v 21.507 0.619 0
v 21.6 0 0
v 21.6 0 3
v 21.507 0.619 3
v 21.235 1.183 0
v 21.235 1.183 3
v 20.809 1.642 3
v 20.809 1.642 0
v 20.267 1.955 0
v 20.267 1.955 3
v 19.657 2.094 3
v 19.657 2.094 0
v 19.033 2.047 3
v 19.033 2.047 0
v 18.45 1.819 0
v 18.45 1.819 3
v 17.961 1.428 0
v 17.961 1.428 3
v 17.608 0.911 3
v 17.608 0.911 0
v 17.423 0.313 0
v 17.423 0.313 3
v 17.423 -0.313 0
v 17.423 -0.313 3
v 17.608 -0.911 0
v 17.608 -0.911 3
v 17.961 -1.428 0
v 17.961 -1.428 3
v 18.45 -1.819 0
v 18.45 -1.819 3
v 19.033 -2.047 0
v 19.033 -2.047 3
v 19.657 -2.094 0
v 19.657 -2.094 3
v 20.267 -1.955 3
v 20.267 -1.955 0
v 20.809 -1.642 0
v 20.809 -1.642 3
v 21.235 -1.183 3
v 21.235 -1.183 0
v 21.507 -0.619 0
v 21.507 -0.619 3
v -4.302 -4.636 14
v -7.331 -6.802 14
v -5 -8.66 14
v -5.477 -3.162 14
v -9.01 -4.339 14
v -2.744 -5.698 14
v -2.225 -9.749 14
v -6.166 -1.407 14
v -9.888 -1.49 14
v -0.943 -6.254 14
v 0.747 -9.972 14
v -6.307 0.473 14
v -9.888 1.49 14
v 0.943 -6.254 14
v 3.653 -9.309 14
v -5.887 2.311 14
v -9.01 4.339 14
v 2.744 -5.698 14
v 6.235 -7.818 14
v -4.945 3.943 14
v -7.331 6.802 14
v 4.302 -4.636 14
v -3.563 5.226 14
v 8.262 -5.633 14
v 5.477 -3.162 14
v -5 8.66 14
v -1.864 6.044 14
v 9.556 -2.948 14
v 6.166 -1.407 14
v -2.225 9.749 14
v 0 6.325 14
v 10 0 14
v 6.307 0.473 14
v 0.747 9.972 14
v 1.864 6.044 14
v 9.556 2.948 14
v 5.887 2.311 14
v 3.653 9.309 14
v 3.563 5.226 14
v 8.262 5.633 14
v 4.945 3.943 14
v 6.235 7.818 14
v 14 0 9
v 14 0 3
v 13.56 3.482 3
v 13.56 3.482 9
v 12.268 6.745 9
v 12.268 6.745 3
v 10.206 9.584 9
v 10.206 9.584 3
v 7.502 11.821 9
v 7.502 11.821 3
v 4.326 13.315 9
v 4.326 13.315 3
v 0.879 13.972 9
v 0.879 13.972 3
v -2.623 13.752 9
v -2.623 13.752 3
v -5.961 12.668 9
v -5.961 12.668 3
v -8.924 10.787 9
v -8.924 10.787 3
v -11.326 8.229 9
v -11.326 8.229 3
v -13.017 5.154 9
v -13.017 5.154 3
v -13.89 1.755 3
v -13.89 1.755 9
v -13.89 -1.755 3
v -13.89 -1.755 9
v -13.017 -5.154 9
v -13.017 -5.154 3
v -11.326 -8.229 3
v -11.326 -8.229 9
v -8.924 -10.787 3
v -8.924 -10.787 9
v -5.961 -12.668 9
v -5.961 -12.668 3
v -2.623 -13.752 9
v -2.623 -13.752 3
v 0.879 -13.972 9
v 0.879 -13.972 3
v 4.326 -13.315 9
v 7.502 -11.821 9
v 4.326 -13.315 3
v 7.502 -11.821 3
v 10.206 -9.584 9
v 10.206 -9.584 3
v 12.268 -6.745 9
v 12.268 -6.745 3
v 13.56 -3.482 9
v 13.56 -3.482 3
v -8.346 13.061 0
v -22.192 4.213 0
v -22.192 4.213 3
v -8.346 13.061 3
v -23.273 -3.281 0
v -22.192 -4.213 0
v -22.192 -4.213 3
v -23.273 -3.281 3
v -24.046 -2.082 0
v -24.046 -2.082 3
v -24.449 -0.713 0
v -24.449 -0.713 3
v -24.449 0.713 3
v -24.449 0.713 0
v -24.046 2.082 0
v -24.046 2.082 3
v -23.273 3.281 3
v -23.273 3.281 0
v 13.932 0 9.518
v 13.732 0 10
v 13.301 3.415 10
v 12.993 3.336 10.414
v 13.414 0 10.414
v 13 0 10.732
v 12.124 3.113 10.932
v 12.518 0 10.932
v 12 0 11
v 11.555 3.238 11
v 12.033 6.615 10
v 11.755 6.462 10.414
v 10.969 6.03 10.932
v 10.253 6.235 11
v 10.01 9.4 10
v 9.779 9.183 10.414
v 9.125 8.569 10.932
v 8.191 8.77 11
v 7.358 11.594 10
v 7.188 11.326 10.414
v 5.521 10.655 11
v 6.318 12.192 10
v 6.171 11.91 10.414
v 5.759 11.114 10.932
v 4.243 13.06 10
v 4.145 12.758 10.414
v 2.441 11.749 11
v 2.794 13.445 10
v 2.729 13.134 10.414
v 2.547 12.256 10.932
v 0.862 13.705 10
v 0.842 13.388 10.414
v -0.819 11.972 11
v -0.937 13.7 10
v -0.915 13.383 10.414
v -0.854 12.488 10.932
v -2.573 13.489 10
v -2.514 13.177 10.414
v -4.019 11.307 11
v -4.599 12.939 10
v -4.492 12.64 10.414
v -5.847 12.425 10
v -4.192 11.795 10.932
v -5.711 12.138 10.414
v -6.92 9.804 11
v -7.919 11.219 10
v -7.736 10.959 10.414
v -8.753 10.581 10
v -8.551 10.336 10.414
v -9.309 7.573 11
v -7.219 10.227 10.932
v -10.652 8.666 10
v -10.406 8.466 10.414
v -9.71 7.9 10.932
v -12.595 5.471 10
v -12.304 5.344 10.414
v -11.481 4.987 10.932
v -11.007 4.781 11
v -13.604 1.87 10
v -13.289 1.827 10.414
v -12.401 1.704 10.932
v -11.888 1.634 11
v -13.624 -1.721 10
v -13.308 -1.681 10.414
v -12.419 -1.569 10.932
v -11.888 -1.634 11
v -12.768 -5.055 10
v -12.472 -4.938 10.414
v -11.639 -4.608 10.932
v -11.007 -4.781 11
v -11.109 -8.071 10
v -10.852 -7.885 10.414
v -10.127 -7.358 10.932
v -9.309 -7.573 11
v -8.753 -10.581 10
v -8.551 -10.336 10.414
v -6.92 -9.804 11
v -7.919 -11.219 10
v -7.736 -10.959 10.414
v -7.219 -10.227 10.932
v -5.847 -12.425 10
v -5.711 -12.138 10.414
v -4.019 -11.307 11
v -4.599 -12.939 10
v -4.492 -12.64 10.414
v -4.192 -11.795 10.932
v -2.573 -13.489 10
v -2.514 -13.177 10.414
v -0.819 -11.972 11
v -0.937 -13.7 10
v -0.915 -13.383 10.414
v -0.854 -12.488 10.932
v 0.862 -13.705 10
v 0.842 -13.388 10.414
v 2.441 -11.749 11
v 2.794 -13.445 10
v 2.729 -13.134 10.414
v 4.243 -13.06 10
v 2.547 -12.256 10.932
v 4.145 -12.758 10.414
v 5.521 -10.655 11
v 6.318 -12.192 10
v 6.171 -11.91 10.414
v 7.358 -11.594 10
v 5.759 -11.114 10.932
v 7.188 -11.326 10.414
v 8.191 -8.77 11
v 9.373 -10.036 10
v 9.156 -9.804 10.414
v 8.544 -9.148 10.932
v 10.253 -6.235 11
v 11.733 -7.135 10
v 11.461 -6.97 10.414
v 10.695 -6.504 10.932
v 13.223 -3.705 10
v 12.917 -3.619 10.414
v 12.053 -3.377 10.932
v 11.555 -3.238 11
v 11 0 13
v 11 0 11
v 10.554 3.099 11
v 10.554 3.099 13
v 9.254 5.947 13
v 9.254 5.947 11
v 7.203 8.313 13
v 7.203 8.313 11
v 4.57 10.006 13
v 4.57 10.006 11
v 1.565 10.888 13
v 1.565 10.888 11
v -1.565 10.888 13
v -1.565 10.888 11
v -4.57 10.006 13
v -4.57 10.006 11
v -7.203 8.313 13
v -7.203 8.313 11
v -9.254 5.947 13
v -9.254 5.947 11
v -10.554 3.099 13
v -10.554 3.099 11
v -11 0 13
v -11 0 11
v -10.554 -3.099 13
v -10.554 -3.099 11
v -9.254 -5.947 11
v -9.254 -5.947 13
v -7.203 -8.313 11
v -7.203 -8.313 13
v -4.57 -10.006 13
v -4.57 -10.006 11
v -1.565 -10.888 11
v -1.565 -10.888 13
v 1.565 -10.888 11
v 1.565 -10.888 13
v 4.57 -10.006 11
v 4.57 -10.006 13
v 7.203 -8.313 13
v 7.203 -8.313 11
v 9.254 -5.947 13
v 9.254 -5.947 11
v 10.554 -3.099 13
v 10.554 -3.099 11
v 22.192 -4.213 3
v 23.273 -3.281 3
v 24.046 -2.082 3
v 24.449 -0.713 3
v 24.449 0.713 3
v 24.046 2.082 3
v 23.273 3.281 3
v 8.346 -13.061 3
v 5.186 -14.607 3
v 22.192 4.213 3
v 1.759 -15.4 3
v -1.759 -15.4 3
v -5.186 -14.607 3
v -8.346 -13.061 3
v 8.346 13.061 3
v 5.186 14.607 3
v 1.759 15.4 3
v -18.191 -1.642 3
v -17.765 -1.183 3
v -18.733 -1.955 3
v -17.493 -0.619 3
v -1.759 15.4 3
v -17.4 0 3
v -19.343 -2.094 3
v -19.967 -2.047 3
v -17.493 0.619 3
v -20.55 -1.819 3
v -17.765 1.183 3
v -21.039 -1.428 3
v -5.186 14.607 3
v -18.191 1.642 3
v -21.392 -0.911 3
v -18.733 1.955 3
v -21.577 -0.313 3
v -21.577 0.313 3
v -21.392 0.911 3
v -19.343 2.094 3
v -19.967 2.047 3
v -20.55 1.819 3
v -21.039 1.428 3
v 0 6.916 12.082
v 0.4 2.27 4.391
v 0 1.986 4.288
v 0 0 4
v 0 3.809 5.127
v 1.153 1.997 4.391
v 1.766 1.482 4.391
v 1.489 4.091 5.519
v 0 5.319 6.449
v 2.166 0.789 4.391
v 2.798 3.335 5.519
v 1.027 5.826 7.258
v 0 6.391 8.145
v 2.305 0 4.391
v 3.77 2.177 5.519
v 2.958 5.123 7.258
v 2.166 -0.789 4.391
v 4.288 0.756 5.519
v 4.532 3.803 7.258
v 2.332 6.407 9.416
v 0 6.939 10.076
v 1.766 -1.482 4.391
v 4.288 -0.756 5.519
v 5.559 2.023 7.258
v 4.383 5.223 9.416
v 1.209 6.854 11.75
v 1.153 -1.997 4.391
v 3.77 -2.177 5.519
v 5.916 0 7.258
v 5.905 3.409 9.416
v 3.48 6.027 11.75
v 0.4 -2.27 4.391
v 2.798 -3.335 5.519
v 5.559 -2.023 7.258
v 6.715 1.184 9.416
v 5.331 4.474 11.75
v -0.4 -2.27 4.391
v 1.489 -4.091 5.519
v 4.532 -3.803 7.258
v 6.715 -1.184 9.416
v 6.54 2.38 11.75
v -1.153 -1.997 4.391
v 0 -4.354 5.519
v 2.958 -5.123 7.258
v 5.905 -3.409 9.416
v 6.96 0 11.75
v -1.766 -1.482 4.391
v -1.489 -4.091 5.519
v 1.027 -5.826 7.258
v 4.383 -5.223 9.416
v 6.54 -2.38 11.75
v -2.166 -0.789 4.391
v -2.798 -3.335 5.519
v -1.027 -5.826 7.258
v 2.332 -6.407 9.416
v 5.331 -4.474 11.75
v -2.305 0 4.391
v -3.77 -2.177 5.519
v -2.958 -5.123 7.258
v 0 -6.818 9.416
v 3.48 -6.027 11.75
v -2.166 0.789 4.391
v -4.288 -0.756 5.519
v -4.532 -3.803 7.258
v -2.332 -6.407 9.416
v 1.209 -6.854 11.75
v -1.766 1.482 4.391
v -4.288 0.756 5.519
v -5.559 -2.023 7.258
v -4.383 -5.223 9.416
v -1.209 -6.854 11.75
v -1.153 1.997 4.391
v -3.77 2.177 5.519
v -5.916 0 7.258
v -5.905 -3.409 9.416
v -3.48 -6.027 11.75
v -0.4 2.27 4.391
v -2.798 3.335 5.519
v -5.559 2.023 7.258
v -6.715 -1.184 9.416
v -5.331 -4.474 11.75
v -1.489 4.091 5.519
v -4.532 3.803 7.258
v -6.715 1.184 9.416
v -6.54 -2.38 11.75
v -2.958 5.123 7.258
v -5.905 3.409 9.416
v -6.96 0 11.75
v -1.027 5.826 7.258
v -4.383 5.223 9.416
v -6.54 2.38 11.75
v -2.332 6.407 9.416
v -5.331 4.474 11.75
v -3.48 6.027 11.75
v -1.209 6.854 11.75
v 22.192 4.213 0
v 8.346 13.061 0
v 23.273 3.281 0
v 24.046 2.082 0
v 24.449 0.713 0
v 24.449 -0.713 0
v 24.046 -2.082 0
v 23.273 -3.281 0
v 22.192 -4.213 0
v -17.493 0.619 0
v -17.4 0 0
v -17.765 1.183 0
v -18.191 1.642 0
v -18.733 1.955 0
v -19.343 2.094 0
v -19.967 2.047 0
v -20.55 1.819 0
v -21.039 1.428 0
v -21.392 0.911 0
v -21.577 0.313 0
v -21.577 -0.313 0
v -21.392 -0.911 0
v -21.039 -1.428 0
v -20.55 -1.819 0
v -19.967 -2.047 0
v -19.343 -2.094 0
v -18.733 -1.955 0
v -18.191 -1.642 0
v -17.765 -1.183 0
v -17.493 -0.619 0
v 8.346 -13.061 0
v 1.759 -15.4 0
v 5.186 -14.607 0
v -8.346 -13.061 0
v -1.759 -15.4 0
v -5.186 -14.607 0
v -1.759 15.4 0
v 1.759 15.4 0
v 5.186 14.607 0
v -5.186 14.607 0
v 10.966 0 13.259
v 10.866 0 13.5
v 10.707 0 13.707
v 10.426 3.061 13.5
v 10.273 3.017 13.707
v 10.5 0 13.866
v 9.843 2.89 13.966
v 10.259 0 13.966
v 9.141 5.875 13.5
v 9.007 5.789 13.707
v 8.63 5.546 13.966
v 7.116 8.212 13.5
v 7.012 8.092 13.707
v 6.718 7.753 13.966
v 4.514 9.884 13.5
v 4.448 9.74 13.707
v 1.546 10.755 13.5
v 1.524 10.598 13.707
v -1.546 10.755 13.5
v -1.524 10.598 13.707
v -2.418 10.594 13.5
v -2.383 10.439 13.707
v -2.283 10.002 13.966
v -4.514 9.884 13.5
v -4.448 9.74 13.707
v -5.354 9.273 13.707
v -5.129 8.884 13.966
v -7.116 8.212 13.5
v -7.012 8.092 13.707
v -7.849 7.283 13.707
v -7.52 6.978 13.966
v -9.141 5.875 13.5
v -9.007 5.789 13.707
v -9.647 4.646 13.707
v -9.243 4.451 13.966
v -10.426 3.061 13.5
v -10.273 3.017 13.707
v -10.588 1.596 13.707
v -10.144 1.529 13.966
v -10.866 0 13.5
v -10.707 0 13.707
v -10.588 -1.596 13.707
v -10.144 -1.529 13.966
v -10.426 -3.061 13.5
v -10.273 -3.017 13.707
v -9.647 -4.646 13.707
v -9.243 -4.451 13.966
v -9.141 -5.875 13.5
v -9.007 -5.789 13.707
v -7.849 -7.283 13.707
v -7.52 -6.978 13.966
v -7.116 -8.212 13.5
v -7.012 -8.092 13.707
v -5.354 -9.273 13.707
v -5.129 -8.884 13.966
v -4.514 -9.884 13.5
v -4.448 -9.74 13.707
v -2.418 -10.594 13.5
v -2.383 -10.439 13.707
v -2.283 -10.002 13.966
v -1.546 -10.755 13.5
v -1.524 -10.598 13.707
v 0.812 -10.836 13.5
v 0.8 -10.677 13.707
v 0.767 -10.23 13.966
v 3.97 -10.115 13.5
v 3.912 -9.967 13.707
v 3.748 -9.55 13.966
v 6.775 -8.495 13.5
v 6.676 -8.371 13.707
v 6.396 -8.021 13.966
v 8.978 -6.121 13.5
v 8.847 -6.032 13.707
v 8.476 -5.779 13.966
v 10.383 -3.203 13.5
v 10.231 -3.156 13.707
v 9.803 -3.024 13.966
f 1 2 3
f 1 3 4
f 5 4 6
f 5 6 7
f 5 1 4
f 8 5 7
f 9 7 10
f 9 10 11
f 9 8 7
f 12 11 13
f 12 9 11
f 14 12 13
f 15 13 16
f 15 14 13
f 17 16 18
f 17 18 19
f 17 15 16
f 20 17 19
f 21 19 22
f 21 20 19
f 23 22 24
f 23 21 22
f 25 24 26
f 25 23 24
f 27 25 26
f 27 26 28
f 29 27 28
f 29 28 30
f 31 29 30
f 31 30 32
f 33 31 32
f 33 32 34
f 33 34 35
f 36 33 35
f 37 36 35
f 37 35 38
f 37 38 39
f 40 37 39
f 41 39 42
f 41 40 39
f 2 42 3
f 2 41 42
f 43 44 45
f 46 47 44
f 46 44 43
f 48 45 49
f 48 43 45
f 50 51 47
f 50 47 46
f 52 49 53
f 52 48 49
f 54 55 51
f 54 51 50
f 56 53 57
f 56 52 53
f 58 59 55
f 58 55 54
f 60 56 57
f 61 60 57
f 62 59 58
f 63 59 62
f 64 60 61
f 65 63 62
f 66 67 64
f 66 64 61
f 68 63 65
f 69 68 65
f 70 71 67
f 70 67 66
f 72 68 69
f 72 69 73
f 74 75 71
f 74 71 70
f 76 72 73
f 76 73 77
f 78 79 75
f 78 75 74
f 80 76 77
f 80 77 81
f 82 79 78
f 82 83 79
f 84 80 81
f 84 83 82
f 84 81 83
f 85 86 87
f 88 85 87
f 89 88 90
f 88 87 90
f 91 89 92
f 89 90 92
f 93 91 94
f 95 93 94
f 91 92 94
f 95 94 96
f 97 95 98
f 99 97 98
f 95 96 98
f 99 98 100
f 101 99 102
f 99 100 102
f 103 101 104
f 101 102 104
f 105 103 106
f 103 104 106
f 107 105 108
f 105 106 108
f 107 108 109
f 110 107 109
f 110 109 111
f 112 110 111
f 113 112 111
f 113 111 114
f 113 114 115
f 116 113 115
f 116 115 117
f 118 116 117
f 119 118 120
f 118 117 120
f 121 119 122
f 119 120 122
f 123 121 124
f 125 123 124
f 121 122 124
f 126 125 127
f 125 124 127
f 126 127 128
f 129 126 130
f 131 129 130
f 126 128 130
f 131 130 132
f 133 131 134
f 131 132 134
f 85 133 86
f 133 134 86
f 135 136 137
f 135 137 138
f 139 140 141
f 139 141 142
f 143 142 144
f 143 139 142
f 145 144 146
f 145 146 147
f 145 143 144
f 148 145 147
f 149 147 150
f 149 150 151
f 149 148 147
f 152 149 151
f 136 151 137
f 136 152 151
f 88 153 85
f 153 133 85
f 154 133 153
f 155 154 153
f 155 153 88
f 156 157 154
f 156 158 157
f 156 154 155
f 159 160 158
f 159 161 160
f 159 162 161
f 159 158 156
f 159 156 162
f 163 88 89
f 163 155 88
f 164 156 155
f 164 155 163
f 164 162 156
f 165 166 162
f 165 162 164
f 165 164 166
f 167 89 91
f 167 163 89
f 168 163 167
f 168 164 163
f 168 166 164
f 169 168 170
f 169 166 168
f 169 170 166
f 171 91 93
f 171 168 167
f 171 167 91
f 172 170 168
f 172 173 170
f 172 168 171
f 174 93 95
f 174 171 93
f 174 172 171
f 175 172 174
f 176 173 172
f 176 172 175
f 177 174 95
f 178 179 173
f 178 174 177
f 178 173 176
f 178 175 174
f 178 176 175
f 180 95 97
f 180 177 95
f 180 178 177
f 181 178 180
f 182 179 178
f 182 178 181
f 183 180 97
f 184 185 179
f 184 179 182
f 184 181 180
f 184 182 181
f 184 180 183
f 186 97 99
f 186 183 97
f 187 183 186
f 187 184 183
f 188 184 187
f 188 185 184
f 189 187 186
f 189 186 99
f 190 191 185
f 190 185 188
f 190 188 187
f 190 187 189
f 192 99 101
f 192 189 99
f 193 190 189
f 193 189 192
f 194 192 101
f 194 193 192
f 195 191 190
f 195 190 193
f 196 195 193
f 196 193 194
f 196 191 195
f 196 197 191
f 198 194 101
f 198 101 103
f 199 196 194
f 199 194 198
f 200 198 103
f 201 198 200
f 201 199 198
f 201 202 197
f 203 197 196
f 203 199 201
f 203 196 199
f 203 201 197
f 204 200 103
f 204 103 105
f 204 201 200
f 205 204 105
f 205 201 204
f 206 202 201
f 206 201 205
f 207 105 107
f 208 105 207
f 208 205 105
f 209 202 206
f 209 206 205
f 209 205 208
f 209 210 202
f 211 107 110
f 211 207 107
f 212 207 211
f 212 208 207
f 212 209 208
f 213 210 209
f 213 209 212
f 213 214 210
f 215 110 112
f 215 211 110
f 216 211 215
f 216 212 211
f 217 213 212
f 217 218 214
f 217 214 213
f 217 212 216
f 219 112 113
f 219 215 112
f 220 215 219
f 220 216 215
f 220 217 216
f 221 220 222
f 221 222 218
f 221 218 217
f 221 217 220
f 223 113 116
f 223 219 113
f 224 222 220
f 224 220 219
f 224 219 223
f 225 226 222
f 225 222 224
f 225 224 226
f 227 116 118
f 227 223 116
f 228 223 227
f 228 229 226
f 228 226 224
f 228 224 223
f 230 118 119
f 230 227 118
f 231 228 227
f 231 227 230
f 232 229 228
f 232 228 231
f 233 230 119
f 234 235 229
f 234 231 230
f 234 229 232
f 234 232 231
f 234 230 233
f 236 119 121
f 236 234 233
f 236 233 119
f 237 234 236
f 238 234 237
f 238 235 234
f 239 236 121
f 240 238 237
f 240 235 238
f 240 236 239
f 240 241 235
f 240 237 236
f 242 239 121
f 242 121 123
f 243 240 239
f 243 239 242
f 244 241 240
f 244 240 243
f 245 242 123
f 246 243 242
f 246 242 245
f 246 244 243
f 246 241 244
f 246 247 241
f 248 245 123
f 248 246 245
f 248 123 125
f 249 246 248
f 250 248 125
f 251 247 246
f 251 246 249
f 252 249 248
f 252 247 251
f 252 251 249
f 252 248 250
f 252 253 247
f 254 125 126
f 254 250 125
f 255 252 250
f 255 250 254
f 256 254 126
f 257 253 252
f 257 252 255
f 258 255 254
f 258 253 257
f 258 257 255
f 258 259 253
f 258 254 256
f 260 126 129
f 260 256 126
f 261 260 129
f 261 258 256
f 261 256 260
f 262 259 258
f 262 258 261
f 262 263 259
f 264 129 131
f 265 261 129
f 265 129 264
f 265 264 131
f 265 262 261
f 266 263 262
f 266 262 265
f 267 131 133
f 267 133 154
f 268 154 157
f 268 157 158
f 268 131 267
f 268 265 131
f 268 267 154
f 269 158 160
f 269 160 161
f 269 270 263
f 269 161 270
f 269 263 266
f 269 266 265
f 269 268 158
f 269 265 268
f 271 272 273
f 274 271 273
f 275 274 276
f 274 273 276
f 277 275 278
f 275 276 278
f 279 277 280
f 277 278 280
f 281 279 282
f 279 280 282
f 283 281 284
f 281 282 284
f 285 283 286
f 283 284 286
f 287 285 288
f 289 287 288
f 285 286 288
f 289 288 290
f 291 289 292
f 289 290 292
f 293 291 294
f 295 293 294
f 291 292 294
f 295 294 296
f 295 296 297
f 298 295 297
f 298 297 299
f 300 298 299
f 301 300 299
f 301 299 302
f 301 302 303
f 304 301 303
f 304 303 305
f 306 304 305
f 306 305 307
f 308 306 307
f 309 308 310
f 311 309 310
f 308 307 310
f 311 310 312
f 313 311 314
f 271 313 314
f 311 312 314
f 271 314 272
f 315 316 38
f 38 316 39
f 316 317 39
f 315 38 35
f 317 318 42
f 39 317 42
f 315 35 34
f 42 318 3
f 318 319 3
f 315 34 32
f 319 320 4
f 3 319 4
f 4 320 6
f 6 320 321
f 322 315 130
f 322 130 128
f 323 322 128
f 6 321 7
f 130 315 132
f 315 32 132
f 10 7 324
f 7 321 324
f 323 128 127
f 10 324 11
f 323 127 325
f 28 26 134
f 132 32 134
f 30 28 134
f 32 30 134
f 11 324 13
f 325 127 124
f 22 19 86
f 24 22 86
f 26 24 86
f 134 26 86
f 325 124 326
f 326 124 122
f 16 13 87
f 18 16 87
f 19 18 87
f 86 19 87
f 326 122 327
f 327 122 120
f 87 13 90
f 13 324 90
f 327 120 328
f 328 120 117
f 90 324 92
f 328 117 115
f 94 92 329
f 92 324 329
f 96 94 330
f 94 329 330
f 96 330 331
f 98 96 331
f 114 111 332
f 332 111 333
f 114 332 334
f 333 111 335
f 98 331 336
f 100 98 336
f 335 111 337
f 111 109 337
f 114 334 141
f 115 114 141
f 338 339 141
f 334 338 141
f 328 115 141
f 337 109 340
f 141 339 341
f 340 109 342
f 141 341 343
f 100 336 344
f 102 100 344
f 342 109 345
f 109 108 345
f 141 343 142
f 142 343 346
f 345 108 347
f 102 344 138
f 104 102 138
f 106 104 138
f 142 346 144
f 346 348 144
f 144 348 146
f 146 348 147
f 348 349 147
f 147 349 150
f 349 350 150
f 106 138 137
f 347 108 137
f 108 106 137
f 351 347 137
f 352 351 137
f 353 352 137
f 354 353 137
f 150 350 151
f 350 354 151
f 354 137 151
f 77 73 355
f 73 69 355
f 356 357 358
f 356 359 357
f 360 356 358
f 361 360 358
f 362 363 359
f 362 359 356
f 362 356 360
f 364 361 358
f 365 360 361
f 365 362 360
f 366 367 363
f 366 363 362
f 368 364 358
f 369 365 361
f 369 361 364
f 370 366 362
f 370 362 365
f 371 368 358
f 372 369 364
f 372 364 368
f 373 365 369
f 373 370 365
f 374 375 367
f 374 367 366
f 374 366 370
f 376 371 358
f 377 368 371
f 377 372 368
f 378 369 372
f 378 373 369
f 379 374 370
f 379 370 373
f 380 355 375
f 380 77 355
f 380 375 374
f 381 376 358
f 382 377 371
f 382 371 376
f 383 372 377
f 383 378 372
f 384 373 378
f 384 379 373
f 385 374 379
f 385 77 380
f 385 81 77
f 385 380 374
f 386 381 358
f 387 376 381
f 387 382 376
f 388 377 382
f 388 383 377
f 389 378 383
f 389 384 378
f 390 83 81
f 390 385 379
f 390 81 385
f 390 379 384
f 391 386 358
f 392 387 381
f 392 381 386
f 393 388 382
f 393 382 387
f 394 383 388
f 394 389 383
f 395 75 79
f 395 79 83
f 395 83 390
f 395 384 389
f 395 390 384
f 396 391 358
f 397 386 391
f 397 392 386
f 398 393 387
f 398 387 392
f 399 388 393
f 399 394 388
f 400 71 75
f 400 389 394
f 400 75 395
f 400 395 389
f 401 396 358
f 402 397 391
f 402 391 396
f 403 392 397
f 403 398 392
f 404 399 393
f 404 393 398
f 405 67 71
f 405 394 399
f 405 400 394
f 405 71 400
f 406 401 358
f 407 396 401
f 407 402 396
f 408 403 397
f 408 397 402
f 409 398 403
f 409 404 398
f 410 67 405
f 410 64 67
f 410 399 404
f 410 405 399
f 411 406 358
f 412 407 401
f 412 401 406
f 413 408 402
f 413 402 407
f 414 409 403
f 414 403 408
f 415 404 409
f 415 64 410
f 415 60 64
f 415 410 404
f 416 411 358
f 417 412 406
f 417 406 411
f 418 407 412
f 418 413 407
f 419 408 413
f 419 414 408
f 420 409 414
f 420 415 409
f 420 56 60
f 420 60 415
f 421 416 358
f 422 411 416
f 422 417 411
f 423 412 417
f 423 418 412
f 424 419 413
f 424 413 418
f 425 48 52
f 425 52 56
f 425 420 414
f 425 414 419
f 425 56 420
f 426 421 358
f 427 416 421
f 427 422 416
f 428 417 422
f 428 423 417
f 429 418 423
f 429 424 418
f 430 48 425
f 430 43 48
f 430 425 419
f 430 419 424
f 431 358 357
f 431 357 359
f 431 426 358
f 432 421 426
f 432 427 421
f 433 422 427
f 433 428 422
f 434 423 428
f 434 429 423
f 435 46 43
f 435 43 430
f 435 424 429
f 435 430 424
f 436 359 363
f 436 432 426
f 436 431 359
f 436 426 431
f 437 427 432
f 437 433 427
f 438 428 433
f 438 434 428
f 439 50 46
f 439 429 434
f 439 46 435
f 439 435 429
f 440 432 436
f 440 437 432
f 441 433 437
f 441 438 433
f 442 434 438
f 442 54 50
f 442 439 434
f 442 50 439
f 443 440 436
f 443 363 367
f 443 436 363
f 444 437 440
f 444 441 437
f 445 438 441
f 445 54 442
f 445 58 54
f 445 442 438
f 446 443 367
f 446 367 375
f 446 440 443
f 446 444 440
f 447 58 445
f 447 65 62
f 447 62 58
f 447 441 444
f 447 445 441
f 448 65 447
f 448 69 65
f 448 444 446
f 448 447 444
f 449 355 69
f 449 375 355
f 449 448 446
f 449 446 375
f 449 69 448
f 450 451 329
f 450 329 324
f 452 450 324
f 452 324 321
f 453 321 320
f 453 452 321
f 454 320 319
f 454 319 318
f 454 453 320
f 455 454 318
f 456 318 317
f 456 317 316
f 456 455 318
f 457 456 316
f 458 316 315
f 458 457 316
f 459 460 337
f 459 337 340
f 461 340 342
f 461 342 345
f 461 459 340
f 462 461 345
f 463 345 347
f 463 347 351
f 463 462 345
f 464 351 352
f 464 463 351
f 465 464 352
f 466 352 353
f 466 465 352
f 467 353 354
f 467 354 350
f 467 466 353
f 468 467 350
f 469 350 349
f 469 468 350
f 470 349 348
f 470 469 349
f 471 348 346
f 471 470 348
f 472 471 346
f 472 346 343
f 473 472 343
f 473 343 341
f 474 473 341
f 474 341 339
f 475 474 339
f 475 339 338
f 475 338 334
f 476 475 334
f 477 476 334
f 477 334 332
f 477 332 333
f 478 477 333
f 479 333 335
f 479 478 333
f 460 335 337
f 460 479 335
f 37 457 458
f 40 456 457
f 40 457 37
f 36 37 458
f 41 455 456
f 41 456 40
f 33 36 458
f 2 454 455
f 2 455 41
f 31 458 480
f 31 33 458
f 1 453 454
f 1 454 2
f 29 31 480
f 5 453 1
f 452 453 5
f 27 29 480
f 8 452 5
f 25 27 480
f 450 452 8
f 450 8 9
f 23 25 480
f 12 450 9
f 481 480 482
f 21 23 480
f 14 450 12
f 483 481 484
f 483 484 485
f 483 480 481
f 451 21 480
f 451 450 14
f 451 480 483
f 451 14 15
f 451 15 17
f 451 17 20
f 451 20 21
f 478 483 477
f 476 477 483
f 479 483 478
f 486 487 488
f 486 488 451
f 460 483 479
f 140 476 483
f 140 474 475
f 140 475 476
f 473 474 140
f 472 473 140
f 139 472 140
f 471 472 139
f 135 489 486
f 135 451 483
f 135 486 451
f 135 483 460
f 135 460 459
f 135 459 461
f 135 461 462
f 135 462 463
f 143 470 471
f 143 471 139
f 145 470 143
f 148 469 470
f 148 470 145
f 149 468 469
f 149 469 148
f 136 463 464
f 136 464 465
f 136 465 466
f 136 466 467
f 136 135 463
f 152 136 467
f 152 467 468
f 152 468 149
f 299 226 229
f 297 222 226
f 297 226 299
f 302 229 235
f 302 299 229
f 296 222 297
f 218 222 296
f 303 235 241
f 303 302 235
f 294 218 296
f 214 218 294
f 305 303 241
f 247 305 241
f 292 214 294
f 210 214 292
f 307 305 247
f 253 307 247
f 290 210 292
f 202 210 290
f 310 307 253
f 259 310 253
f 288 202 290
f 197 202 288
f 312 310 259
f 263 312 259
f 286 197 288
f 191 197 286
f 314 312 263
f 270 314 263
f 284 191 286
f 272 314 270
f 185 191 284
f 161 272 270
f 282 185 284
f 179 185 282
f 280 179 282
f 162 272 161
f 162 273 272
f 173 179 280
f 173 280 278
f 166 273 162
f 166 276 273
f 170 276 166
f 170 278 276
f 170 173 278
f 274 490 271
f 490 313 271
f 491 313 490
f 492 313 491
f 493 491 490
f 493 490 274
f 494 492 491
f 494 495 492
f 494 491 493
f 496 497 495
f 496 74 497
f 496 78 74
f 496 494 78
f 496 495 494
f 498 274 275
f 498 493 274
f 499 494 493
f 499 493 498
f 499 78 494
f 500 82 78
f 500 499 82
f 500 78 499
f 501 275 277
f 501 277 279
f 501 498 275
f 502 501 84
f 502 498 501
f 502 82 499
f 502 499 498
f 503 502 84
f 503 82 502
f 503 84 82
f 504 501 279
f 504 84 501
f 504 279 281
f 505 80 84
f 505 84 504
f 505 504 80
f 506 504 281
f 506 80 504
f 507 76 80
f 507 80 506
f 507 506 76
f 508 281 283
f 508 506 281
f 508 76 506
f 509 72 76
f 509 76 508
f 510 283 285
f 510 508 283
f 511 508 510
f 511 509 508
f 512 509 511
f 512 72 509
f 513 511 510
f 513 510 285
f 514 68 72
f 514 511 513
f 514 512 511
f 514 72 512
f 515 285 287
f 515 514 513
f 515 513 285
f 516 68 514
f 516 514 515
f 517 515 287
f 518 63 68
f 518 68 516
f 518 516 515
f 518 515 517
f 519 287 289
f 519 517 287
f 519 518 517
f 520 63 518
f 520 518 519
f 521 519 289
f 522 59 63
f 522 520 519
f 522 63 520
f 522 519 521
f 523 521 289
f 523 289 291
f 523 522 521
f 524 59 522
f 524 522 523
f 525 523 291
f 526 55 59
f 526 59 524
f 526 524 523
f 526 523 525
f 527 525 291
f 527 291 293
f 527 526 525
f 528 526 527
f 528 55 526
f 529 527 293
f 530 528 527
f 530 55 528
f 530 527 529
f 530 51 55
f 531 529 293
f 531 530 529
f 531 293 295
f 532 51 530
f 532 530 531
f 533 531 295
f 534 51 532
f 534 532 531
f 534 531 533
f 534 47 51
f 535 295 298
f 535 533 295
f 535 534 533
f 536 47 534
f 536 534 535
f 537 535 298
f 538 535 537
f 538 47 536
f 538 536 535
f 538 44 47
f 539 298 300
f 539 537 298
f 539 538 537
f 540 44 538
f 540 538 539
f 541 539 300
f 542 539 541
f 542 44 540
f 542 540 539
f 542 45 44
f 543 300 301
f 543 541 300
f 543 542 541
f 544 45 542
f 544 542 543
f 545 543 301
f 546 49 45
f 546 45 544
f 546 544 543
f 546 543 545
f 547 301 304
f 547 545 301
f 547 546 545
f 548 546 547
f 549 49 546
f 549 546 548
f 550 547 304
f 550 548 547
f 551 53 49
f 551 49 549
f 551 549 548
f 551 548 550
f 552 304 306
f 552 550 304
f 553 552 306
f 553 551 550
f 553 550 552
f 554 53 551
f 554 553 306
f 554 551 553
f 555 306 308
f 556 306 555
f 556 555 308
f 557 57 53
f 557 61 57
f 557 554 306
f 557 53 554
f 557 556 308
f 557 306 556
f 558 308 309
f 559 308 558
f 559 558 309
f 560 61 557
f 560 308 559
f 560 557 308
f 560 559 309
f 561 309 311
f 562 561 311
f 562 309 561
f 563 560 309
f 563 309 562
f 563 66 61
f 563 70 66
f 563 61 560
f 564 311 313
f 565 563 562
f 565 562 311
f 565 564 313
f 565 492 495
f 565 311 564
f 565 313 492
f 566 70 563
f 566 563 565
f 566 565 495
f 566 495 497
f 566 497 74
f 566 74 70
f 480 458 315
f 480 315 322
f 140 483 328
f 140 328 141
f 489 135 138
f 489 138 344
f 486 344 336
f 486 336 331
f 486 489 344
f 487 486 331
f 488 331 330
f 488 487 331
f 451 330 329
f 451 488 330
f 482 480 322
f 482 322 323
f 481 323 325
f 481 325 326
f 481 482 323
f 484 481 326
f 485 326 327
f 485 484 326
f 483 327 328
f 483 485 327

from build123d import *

# Parameters (mm, degrees)
SKETCH_1_R      = 2.1
EXTRUDE_1_DEPTH = 3
SKETCH_2_R      = 14
EXTRUDE_2_DEPTH = 8
SKETCH_3_R      = 11
EXTRUDE_3_DEPTH = 3
FILLET_1_R      = 2
FILLET_2_R      = 1


with BuildPart() as part:
    # 草图1 → 凸台-拉伸1 (new body)
    with BuildSketch(Plane.XY):
        with BuildLine():
            Line((-22.192307692, 4.213250442), (-8.346153846, 13.061076371))
            ThreePointArc((-8.346153846, 13.061076371), (0, 15.5), (8.346153846, 13.061076371))
            Line((8.346153846, 13.061076371), (22.192307692, 4.213250442))
            ThreePointArc((22.192307692, 4.213250442), (24.5, 0), (22.192307692, -4.213250442))
            Line((22.192307692, -4.213250442), (8.346153846, -13.061076371))
            ThreePointArc((8.346153846, -13.061076371), (0, -15.5), (-8.346153846, -13.061076371))
            Line((-8.346153846, -13.061076371), (-22.192307692, -4.213250442))
            ThreePointArc((-22.192307692, -4.213250442), (-24.5, 0), (-22.192307692, 4.213250442))
        make_face()
        with Locations((-19.5, 0)):
            Circle(SKETCH_1_R, mode=Mode.SUBTRACT)
        with Locations((19.5, 0)):
            Circle(SKETCH_1_R, mode=Mode.SUBTRACT)
    extrude(amount=EXTRUDE_1_DEPTH)

    # 草图2 → 凸台-拉伸2 (add)
    with BuildSketch(Plane.XY.offset(3)):
        Circle(SKETCH_2_R)
    extrude(amount=EXTRUDE_2_DEPTH)

    # 草图3 → 凸台-拉伸3 (add)
    with BuildSketch(Plane.XY.offset(11)):
        Circle(SKETCH_3_R)
    extrude(amount=EXTRUDE_3_DEPTH)

    # 草图4 → 切除-旋转1 (revolve, cut)
    with BuildSketch(Plane(origin=(0, 0, 0), x_dir=(0, 0, -1), z_dir=(1, 0, 0))):
        with BuildLine():
            Line((-18, 0), (-4, 0))
            ThreePointArc((-4, 0), (-11, 7), (-18, 0))
        make_face()
    revolve(axis=Axis((0, 0, 18), (0, 0, -1)), mode=Mode.SUBTRACT)

    # 圆角1
    fillet_1_edges = [part.edges().sort_by_distance(p)[0] for p in [
        (-14, 0, 11),
    ]]
    fillet(fillet_1_edges, radius=FILLET_1_R)

    # 圆角2
    fillet_2_edges = [part.edges().sort_by_distance(p)[0] for p in [
        (-11, 0, 14),
    ]]
    fillet(fillet_2_edges, radius=FILLET_2_R)


solid = part.part
